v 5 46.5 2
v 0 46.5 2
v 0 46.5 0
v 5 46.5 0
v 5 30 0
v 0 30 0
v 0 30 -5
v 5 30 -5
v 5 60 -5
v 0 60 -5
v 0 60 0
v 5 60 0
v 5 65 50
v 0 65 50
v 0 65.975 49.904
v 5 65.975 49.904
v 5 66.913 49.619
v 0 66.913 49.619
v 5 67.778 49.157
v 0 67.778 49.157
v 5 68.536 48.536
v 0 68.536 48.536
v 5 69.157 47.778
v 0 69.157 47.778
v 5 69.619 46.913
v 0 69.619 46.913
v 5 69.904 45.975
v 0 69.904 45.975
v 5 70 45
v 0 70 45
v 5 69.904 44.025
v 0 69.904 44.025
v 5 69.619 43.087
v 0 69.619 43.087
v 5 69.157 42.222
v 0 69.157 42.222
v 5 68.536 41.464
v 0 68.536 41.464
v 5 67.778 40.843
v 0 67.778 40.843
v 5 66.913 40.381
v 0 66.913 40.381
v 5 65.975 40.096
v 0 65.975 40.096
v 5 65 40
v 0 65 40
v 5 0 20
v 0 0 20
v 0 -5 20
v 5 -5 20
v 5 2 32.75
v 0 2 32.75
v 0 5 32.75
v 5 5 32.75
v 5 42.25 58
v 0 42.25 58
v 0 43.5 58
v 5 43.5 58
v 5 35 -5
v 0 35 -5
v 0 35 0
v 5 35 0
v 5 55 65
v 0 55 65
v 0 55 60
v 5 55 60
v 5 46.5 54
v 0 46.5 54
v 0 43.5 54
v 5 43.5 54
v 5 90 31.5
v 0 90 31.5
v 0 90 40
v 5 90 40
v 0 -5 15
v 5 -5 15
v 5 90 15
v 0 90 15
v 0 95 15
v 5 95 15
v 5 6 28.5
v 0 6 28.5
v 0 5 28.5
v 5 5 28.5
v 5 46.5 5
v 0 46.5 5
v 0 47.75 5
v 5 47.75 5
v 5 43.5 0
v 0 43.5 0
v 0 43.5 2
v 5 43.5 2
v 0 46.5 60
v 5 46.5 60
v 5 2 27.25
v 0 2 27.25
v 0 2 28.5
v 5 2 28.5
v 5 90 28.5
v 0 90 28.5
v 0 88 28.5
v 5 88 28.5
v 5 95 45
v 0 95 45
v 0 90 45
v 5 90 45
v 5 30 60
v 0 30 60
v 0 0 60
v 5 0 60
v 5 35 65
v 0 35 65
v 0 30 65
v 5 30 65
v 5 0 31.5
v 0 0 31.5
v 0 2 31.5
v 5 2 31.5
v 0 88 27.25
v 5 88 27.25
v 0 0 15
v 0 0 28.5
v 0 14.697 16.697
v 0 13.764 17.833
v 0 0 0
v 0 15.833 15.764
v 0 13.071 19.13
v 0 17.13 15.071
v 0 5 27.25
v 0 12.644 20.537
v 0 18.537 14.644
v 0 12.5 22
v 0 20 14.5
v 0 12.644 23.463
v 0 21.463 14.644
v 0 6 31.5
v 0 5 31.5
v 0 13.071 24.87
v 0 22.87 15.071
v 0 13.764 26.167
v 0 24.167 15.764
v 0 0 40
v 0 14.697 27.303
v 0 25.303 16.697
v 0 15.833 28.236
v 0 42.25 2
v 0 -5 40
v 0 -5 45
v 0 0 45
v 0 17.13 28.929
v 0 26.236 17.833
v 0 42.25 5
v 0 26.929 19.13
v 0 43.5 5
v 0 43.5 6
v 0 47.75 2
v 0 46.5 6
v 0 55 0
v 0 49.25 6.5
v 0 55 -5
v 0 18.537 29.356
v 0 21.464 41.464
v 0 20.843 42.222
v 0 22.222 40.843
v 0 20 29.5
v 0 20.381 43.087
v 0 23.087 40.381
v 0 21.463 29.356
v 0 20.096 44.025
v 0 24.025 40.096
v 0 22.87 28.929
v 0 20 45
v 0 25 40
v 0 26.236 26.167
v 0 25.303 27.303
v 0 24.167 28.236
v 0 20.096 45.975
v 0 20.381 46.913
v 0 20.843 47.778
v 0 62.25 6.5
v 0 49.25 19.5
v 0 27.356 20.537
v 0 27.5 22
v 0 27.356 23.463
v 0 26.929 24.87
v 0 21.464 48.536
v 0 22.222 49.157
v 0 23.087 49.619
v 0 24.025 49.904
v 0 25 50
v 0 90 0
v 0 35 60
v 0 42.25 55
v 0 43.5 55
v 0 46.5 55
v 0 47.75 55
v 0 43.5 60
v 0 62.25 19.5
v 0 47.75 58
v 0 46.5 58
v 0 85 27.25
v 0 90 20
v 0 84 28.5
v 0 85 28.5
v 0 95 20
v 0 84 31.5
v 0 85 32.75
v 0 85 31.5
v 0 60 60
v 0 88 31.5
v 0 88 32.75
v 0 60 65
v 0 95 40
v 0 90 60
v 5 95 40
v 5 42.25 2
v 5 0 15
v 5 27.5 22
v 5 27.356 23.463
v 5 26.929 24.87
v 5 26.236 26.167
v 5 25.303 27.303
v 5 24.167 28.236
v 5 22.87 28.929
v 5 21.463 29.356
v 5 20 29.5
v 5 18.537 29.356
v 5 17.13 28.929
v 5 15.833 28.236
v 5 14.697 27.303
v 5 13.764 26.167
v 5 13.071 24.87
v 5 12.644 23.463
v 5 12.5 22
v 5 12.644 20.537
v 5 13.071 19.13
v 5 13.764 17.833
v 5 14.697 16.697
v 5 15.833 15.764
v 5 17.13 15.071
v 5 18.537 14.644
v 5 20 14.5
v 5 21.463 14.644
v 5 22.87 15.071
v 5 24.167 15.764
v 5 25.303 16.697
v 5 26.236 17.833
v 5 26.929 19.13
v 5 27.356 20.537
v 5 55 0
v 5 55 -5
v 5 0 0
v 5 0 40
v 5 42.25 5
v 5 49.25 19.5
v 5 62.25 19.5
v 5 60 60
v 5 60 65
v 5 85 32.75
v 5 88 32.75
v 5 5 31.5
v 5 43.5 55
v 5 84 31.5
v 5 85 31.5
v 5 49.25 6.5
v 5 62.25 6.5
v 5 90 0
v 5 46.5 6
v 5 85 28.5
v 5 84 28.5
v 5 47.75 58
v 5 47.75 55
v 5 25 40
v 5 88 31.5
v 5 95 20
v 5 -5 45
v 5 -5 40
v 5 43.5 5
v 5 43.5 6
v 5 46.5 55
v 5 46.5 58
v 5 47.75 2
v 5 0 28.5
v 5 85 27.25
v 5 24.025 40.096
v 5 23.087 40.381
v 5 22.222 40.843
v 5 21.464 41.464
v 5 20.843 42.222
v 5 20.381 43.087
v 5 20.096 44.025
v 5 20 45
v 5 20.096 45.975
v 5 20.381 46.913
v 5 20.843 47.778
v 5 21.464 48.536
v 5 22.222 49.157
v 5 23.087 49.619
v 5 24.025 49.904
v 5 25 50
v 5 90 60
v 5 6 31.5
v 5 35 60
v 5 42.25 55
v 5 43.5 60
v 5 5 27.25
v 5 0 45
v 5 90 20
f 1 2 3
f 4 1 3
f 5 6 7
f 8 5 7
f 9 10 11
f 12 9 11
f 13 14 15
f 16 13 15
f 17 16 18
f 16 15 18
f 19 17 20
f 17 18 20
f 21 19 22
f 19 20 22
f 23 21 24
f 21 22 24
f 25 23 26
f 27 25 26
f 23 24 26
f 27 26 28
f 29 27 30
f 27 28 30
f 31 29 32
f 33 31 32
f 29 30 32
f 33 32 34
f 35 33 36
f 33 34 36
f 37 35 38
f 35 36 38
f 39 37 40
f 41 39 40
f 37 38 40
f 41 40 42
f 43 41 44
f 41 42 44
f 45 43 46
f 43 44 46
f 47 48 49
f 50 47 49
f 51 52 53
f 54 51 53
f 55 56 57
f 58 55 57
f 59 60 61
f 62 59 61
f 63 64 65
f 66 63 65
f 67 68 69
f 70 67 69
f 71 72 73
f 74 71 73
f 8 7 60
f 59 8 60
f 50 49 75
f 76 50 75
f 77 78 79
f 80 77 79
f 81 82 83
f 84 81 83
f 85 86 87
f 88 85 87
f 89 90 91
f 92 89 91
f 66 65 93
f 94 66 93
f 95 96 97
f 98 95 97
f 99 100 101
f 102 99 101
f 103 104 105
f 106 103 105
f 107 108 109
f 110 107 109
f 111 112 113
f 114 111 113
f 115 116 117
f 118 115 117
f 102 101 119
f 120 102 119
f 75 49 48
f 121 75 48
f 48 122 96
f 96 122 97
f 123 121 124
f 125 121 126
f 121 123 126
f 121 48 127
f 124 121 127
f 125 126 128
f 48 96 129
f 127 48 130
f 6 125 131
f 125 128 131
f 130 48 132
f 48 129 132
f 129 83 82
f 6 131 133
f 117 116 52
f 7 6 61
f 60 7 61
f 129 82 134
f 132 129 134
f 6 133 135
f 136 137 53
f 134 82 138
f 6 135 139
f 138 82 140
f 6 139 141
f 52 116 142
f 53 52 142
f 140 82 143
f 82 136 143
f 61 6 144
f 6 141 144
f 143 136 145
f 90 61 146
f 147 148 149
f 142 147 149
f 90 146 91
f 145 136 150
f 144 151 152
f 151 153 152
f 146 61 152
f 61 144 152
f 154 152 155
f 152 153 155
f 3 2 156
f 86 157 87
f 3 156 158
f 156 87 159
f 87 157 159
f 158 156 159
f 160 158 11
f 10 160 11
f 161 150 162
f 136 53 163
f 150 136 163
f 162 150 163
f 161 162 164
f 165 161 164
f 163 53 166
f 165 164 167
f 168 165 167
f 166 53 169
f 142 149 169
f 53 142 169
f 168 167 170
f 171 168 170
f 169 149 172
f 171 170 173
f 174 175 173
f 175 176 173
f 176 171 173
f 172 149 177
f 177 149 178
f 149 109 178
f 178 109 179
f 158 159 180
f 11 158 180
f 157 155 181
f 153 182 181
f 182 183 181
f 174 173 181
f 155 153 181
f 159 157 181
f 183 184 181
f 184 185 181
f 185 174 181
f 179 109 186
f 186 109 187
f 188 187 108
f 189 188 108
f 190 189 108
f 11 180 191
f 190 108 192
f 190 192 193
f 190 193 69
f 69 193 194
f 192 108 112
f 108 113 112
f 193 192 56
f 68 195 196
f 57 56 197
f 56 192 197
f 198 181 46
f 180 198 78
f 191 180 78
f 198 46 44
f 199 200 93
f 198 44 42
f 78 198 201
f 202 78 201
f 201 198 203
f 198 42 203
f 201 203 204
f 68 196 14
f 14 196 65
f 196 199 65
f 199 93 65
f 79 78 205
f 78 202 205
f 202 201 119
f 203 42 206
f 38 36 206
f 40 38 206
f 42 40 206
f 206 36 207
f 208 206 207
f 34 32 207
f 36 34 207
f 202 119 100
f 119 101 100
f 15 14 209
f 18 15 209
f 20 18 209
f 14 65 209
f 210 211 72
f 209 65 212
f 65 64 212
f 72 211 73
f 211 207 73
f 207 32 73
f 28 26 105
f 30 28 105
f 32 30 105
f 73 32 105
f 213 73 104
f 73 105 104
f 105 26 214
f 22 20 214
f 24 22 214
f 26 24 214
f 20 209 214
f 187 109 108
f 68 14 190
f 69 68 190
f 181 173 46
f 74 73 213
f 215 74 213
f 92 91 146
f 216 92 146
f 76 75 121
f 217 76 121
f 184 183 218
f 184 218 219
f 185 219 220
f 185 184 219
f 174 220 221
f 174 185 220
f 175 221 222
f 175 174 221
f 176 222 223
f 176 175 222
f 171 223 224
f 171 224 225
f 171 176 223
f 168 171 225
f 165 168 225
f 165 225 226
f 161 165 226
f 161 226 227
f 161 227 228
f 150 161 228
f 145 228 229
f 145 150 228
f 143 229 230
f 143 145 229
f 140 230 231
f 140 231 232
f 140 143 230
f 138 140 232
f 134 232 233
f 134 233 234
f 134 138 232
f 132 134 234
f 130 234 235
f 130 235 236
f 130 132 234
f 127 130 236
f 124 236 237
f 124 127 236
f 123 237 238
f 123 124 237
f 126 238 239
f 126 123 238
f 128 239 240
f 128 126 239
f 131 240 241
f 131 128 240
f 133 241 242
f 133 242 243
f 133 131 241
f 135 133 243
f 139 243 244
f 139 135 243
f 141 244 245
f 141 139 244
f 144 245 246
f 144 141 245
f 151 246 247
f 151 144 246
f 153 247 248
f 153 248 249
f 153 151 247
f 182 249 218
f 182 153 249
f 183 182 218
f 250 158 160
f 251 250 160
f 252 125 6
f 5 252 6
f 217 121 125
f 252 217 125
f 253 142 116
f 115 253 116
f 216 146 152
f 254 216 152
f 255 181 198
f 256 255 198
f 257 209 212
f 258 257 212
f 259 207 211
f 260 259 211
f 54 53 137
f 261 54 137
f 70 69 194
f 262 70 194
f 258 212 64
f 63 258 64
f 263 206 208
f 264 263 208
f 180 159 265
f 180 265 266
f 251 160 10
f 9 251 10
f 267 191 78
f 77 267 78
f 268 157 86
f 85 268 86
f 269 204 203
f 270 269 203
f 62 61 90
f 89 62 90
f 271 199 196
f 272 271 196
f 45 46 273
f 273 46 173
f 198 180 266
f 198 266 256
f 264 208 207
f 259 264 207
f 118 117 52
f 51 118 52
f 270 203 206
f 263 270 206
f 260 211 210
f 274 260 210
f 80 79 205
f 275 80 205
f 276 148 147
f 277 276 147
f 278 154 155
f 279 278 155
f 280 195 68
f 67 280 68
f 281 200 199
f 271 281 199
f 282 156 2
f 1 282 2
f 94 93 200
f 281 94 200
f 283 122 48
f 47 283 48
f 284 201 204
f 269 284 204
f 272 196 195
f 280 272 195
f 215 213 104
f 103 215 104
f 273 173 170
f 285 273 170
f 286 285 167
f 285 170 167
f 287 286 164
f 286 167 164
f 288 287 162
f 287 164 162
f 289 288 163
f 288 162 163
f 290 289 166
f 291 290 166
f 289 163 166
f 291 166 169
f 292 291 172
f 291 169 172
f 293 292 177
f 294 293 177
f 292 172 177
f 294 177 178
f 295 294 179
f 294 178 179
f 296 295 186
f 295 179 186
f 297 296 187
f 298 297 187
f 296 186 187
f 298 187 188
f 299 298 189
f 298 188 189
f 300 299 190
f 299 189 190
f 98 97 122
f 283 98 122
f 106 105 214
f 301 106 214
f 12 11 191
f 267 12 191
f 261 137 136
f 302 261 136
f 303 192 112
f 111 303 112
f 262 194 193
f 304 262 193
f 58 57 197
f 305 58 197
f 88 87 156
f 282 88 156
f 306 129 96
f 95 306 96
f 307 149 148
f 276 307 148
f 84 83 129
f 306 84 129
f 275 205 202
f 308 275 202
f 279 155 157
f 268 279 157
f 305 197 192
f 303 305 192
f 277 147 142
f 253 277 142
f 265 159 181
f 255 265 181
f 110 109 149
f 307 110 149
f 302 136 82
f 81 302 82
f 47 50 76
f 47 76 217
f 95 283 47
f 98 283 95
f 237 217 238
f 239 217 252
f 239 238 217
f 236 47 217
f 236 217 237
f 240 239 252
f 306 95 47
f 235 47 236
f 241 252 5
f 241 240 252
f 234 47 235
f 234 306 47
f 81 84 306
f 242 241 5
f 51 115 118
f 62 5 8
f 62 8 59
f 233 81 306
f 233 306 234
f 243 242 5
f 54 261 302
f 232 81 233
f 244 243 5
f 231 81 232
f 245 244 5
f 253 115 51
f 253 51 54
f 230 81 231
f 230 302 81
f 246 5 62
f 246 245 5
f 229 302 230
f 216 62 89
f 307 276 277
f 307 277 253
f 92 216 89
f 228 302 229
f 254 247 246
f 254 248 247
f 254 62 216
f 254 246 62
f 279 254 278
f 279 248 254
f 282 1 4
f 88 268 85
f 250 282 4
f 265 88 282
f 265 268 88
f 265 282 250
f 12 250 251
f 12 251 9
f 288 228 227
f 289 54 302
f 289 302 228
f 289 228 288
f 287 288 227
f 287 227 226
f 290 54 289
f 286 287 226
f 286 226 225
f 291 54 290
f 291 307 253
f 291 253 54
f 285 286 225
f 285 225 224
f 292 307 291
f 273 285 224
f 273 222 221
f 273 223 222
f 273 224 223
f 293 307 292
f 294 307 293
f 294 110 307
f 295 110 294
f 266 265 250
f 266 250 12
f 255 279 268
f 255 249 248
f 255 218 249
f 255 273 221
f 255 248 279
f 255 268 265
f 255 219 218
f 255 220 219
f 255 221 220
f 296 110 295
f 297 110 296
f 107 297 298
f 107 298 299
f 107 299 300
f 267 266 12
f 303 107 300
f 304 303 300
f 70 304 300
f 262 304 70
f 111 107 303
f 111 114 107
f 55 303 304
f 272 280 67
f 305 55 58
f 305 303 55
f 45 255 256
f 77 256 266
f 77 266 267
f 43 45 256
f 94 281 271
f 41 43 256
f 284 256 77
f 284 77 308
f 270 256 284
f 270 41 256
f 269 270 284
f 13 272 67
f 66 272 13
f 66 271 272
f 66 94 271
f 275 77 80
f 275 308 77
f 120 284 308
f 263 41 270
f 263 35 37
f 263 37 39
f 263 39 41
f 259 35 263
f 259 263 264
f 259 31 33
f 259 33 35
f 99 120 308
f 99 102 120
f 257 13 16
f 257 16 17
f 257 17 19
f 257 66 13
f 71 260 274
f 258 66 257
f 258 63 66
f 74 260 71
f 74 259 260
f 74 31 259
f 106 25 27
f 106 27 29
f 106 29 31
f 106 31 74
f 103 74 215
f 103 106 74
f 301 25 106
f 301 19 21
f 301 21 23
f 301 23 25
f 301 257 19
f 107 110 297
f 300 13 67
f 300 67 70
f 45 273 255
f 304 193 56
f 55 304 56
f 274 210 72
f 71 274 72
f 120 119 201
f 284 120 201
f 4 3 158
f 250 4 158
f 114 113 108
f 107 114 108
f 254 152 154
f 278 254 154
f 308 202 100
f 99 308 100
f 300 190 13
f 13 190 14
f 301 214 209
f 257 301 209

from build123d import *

# Parameters (mm, degrees)
F1_R     = 7.5
F1_W     = 13
F1_H     = 13
F2_DEPTH = 5


with BuildPart() as f2:
    # F1 (on Right) → F2 (new body)
    with BuildSketch(Plane.YZ):
        Polygon((0, 15), (0, 0), (30, 0), (30, -5), (35, -5), (35, 0), (43.5, 0), (43.5, 2), (42.25, 2), (42.25, 5), (43.5, 5), (43.5, 6), (46.5, 6), (46.5, 5), (47.75, 5), (47.75, 2), (46.5, 2), (46.5, 0), (55, 0), (55, -5), (60, -5), (60, 0), (90, 0), (90, 15), (95, 15), (95, 20), (90, 20), (90, 28.5), (88, 28.5), (88, 27.25), (85, 27.25), (85, 28.5), (84, 28.5), (84, 31.5), (85, 31.5), (85, 32.75), (88, 32.75), (88, 31.5), (90, 31.5), (90, 40), (95, 40), (95, 45), (90, 45), (90, 60), (60, 60), (60, 65), (55, 65), (55, 60), (46.5, 60), (46.5, 58), (47.75, 58), (47.75, 55), (46.5, 55), (46.5, 54), (43.5, 54), (43.5, 55), (42.25, 55), (42.25, 58), (43.5, 58), (43.5, 60), (35, 60), (35, 65), (30, 65), (30, 60), (0, 60), (0, 45), (-5, 45), (-5, 40), (0, 40), (0, 31.5), (2, 31.5), (2, 32.75), (5, 32.75), (5, 31.5), (6, 31.5), (6, 28.5), (5, 28.5), (5, 27.25), (2, 27.25), (2, 28.5), (0, 28.5), (0, 20), (-5, 20), (-5, 15), align=None)
        with Locations((20, 22)):
            Circle(F1_R, mode=Mode.SUBTRACT)
        with Locations((55.75, 13)):
            Rectangle(F1_W, F1_H, mode=Mode.SUBTRACT)
        with BuildLine():
            Line((25, 50), (65, 50))
            ThreePointArc((65, 50), (70, 45), (65, 40))
            Line((65, 40), (25, 40))
            ThreePointArc((25, 40), (20, 45), (25, 50))
        make_face(mode=Mode.SUBTRACT)
    extrude(amount=F2_DEPTH)


solid = f2.part
